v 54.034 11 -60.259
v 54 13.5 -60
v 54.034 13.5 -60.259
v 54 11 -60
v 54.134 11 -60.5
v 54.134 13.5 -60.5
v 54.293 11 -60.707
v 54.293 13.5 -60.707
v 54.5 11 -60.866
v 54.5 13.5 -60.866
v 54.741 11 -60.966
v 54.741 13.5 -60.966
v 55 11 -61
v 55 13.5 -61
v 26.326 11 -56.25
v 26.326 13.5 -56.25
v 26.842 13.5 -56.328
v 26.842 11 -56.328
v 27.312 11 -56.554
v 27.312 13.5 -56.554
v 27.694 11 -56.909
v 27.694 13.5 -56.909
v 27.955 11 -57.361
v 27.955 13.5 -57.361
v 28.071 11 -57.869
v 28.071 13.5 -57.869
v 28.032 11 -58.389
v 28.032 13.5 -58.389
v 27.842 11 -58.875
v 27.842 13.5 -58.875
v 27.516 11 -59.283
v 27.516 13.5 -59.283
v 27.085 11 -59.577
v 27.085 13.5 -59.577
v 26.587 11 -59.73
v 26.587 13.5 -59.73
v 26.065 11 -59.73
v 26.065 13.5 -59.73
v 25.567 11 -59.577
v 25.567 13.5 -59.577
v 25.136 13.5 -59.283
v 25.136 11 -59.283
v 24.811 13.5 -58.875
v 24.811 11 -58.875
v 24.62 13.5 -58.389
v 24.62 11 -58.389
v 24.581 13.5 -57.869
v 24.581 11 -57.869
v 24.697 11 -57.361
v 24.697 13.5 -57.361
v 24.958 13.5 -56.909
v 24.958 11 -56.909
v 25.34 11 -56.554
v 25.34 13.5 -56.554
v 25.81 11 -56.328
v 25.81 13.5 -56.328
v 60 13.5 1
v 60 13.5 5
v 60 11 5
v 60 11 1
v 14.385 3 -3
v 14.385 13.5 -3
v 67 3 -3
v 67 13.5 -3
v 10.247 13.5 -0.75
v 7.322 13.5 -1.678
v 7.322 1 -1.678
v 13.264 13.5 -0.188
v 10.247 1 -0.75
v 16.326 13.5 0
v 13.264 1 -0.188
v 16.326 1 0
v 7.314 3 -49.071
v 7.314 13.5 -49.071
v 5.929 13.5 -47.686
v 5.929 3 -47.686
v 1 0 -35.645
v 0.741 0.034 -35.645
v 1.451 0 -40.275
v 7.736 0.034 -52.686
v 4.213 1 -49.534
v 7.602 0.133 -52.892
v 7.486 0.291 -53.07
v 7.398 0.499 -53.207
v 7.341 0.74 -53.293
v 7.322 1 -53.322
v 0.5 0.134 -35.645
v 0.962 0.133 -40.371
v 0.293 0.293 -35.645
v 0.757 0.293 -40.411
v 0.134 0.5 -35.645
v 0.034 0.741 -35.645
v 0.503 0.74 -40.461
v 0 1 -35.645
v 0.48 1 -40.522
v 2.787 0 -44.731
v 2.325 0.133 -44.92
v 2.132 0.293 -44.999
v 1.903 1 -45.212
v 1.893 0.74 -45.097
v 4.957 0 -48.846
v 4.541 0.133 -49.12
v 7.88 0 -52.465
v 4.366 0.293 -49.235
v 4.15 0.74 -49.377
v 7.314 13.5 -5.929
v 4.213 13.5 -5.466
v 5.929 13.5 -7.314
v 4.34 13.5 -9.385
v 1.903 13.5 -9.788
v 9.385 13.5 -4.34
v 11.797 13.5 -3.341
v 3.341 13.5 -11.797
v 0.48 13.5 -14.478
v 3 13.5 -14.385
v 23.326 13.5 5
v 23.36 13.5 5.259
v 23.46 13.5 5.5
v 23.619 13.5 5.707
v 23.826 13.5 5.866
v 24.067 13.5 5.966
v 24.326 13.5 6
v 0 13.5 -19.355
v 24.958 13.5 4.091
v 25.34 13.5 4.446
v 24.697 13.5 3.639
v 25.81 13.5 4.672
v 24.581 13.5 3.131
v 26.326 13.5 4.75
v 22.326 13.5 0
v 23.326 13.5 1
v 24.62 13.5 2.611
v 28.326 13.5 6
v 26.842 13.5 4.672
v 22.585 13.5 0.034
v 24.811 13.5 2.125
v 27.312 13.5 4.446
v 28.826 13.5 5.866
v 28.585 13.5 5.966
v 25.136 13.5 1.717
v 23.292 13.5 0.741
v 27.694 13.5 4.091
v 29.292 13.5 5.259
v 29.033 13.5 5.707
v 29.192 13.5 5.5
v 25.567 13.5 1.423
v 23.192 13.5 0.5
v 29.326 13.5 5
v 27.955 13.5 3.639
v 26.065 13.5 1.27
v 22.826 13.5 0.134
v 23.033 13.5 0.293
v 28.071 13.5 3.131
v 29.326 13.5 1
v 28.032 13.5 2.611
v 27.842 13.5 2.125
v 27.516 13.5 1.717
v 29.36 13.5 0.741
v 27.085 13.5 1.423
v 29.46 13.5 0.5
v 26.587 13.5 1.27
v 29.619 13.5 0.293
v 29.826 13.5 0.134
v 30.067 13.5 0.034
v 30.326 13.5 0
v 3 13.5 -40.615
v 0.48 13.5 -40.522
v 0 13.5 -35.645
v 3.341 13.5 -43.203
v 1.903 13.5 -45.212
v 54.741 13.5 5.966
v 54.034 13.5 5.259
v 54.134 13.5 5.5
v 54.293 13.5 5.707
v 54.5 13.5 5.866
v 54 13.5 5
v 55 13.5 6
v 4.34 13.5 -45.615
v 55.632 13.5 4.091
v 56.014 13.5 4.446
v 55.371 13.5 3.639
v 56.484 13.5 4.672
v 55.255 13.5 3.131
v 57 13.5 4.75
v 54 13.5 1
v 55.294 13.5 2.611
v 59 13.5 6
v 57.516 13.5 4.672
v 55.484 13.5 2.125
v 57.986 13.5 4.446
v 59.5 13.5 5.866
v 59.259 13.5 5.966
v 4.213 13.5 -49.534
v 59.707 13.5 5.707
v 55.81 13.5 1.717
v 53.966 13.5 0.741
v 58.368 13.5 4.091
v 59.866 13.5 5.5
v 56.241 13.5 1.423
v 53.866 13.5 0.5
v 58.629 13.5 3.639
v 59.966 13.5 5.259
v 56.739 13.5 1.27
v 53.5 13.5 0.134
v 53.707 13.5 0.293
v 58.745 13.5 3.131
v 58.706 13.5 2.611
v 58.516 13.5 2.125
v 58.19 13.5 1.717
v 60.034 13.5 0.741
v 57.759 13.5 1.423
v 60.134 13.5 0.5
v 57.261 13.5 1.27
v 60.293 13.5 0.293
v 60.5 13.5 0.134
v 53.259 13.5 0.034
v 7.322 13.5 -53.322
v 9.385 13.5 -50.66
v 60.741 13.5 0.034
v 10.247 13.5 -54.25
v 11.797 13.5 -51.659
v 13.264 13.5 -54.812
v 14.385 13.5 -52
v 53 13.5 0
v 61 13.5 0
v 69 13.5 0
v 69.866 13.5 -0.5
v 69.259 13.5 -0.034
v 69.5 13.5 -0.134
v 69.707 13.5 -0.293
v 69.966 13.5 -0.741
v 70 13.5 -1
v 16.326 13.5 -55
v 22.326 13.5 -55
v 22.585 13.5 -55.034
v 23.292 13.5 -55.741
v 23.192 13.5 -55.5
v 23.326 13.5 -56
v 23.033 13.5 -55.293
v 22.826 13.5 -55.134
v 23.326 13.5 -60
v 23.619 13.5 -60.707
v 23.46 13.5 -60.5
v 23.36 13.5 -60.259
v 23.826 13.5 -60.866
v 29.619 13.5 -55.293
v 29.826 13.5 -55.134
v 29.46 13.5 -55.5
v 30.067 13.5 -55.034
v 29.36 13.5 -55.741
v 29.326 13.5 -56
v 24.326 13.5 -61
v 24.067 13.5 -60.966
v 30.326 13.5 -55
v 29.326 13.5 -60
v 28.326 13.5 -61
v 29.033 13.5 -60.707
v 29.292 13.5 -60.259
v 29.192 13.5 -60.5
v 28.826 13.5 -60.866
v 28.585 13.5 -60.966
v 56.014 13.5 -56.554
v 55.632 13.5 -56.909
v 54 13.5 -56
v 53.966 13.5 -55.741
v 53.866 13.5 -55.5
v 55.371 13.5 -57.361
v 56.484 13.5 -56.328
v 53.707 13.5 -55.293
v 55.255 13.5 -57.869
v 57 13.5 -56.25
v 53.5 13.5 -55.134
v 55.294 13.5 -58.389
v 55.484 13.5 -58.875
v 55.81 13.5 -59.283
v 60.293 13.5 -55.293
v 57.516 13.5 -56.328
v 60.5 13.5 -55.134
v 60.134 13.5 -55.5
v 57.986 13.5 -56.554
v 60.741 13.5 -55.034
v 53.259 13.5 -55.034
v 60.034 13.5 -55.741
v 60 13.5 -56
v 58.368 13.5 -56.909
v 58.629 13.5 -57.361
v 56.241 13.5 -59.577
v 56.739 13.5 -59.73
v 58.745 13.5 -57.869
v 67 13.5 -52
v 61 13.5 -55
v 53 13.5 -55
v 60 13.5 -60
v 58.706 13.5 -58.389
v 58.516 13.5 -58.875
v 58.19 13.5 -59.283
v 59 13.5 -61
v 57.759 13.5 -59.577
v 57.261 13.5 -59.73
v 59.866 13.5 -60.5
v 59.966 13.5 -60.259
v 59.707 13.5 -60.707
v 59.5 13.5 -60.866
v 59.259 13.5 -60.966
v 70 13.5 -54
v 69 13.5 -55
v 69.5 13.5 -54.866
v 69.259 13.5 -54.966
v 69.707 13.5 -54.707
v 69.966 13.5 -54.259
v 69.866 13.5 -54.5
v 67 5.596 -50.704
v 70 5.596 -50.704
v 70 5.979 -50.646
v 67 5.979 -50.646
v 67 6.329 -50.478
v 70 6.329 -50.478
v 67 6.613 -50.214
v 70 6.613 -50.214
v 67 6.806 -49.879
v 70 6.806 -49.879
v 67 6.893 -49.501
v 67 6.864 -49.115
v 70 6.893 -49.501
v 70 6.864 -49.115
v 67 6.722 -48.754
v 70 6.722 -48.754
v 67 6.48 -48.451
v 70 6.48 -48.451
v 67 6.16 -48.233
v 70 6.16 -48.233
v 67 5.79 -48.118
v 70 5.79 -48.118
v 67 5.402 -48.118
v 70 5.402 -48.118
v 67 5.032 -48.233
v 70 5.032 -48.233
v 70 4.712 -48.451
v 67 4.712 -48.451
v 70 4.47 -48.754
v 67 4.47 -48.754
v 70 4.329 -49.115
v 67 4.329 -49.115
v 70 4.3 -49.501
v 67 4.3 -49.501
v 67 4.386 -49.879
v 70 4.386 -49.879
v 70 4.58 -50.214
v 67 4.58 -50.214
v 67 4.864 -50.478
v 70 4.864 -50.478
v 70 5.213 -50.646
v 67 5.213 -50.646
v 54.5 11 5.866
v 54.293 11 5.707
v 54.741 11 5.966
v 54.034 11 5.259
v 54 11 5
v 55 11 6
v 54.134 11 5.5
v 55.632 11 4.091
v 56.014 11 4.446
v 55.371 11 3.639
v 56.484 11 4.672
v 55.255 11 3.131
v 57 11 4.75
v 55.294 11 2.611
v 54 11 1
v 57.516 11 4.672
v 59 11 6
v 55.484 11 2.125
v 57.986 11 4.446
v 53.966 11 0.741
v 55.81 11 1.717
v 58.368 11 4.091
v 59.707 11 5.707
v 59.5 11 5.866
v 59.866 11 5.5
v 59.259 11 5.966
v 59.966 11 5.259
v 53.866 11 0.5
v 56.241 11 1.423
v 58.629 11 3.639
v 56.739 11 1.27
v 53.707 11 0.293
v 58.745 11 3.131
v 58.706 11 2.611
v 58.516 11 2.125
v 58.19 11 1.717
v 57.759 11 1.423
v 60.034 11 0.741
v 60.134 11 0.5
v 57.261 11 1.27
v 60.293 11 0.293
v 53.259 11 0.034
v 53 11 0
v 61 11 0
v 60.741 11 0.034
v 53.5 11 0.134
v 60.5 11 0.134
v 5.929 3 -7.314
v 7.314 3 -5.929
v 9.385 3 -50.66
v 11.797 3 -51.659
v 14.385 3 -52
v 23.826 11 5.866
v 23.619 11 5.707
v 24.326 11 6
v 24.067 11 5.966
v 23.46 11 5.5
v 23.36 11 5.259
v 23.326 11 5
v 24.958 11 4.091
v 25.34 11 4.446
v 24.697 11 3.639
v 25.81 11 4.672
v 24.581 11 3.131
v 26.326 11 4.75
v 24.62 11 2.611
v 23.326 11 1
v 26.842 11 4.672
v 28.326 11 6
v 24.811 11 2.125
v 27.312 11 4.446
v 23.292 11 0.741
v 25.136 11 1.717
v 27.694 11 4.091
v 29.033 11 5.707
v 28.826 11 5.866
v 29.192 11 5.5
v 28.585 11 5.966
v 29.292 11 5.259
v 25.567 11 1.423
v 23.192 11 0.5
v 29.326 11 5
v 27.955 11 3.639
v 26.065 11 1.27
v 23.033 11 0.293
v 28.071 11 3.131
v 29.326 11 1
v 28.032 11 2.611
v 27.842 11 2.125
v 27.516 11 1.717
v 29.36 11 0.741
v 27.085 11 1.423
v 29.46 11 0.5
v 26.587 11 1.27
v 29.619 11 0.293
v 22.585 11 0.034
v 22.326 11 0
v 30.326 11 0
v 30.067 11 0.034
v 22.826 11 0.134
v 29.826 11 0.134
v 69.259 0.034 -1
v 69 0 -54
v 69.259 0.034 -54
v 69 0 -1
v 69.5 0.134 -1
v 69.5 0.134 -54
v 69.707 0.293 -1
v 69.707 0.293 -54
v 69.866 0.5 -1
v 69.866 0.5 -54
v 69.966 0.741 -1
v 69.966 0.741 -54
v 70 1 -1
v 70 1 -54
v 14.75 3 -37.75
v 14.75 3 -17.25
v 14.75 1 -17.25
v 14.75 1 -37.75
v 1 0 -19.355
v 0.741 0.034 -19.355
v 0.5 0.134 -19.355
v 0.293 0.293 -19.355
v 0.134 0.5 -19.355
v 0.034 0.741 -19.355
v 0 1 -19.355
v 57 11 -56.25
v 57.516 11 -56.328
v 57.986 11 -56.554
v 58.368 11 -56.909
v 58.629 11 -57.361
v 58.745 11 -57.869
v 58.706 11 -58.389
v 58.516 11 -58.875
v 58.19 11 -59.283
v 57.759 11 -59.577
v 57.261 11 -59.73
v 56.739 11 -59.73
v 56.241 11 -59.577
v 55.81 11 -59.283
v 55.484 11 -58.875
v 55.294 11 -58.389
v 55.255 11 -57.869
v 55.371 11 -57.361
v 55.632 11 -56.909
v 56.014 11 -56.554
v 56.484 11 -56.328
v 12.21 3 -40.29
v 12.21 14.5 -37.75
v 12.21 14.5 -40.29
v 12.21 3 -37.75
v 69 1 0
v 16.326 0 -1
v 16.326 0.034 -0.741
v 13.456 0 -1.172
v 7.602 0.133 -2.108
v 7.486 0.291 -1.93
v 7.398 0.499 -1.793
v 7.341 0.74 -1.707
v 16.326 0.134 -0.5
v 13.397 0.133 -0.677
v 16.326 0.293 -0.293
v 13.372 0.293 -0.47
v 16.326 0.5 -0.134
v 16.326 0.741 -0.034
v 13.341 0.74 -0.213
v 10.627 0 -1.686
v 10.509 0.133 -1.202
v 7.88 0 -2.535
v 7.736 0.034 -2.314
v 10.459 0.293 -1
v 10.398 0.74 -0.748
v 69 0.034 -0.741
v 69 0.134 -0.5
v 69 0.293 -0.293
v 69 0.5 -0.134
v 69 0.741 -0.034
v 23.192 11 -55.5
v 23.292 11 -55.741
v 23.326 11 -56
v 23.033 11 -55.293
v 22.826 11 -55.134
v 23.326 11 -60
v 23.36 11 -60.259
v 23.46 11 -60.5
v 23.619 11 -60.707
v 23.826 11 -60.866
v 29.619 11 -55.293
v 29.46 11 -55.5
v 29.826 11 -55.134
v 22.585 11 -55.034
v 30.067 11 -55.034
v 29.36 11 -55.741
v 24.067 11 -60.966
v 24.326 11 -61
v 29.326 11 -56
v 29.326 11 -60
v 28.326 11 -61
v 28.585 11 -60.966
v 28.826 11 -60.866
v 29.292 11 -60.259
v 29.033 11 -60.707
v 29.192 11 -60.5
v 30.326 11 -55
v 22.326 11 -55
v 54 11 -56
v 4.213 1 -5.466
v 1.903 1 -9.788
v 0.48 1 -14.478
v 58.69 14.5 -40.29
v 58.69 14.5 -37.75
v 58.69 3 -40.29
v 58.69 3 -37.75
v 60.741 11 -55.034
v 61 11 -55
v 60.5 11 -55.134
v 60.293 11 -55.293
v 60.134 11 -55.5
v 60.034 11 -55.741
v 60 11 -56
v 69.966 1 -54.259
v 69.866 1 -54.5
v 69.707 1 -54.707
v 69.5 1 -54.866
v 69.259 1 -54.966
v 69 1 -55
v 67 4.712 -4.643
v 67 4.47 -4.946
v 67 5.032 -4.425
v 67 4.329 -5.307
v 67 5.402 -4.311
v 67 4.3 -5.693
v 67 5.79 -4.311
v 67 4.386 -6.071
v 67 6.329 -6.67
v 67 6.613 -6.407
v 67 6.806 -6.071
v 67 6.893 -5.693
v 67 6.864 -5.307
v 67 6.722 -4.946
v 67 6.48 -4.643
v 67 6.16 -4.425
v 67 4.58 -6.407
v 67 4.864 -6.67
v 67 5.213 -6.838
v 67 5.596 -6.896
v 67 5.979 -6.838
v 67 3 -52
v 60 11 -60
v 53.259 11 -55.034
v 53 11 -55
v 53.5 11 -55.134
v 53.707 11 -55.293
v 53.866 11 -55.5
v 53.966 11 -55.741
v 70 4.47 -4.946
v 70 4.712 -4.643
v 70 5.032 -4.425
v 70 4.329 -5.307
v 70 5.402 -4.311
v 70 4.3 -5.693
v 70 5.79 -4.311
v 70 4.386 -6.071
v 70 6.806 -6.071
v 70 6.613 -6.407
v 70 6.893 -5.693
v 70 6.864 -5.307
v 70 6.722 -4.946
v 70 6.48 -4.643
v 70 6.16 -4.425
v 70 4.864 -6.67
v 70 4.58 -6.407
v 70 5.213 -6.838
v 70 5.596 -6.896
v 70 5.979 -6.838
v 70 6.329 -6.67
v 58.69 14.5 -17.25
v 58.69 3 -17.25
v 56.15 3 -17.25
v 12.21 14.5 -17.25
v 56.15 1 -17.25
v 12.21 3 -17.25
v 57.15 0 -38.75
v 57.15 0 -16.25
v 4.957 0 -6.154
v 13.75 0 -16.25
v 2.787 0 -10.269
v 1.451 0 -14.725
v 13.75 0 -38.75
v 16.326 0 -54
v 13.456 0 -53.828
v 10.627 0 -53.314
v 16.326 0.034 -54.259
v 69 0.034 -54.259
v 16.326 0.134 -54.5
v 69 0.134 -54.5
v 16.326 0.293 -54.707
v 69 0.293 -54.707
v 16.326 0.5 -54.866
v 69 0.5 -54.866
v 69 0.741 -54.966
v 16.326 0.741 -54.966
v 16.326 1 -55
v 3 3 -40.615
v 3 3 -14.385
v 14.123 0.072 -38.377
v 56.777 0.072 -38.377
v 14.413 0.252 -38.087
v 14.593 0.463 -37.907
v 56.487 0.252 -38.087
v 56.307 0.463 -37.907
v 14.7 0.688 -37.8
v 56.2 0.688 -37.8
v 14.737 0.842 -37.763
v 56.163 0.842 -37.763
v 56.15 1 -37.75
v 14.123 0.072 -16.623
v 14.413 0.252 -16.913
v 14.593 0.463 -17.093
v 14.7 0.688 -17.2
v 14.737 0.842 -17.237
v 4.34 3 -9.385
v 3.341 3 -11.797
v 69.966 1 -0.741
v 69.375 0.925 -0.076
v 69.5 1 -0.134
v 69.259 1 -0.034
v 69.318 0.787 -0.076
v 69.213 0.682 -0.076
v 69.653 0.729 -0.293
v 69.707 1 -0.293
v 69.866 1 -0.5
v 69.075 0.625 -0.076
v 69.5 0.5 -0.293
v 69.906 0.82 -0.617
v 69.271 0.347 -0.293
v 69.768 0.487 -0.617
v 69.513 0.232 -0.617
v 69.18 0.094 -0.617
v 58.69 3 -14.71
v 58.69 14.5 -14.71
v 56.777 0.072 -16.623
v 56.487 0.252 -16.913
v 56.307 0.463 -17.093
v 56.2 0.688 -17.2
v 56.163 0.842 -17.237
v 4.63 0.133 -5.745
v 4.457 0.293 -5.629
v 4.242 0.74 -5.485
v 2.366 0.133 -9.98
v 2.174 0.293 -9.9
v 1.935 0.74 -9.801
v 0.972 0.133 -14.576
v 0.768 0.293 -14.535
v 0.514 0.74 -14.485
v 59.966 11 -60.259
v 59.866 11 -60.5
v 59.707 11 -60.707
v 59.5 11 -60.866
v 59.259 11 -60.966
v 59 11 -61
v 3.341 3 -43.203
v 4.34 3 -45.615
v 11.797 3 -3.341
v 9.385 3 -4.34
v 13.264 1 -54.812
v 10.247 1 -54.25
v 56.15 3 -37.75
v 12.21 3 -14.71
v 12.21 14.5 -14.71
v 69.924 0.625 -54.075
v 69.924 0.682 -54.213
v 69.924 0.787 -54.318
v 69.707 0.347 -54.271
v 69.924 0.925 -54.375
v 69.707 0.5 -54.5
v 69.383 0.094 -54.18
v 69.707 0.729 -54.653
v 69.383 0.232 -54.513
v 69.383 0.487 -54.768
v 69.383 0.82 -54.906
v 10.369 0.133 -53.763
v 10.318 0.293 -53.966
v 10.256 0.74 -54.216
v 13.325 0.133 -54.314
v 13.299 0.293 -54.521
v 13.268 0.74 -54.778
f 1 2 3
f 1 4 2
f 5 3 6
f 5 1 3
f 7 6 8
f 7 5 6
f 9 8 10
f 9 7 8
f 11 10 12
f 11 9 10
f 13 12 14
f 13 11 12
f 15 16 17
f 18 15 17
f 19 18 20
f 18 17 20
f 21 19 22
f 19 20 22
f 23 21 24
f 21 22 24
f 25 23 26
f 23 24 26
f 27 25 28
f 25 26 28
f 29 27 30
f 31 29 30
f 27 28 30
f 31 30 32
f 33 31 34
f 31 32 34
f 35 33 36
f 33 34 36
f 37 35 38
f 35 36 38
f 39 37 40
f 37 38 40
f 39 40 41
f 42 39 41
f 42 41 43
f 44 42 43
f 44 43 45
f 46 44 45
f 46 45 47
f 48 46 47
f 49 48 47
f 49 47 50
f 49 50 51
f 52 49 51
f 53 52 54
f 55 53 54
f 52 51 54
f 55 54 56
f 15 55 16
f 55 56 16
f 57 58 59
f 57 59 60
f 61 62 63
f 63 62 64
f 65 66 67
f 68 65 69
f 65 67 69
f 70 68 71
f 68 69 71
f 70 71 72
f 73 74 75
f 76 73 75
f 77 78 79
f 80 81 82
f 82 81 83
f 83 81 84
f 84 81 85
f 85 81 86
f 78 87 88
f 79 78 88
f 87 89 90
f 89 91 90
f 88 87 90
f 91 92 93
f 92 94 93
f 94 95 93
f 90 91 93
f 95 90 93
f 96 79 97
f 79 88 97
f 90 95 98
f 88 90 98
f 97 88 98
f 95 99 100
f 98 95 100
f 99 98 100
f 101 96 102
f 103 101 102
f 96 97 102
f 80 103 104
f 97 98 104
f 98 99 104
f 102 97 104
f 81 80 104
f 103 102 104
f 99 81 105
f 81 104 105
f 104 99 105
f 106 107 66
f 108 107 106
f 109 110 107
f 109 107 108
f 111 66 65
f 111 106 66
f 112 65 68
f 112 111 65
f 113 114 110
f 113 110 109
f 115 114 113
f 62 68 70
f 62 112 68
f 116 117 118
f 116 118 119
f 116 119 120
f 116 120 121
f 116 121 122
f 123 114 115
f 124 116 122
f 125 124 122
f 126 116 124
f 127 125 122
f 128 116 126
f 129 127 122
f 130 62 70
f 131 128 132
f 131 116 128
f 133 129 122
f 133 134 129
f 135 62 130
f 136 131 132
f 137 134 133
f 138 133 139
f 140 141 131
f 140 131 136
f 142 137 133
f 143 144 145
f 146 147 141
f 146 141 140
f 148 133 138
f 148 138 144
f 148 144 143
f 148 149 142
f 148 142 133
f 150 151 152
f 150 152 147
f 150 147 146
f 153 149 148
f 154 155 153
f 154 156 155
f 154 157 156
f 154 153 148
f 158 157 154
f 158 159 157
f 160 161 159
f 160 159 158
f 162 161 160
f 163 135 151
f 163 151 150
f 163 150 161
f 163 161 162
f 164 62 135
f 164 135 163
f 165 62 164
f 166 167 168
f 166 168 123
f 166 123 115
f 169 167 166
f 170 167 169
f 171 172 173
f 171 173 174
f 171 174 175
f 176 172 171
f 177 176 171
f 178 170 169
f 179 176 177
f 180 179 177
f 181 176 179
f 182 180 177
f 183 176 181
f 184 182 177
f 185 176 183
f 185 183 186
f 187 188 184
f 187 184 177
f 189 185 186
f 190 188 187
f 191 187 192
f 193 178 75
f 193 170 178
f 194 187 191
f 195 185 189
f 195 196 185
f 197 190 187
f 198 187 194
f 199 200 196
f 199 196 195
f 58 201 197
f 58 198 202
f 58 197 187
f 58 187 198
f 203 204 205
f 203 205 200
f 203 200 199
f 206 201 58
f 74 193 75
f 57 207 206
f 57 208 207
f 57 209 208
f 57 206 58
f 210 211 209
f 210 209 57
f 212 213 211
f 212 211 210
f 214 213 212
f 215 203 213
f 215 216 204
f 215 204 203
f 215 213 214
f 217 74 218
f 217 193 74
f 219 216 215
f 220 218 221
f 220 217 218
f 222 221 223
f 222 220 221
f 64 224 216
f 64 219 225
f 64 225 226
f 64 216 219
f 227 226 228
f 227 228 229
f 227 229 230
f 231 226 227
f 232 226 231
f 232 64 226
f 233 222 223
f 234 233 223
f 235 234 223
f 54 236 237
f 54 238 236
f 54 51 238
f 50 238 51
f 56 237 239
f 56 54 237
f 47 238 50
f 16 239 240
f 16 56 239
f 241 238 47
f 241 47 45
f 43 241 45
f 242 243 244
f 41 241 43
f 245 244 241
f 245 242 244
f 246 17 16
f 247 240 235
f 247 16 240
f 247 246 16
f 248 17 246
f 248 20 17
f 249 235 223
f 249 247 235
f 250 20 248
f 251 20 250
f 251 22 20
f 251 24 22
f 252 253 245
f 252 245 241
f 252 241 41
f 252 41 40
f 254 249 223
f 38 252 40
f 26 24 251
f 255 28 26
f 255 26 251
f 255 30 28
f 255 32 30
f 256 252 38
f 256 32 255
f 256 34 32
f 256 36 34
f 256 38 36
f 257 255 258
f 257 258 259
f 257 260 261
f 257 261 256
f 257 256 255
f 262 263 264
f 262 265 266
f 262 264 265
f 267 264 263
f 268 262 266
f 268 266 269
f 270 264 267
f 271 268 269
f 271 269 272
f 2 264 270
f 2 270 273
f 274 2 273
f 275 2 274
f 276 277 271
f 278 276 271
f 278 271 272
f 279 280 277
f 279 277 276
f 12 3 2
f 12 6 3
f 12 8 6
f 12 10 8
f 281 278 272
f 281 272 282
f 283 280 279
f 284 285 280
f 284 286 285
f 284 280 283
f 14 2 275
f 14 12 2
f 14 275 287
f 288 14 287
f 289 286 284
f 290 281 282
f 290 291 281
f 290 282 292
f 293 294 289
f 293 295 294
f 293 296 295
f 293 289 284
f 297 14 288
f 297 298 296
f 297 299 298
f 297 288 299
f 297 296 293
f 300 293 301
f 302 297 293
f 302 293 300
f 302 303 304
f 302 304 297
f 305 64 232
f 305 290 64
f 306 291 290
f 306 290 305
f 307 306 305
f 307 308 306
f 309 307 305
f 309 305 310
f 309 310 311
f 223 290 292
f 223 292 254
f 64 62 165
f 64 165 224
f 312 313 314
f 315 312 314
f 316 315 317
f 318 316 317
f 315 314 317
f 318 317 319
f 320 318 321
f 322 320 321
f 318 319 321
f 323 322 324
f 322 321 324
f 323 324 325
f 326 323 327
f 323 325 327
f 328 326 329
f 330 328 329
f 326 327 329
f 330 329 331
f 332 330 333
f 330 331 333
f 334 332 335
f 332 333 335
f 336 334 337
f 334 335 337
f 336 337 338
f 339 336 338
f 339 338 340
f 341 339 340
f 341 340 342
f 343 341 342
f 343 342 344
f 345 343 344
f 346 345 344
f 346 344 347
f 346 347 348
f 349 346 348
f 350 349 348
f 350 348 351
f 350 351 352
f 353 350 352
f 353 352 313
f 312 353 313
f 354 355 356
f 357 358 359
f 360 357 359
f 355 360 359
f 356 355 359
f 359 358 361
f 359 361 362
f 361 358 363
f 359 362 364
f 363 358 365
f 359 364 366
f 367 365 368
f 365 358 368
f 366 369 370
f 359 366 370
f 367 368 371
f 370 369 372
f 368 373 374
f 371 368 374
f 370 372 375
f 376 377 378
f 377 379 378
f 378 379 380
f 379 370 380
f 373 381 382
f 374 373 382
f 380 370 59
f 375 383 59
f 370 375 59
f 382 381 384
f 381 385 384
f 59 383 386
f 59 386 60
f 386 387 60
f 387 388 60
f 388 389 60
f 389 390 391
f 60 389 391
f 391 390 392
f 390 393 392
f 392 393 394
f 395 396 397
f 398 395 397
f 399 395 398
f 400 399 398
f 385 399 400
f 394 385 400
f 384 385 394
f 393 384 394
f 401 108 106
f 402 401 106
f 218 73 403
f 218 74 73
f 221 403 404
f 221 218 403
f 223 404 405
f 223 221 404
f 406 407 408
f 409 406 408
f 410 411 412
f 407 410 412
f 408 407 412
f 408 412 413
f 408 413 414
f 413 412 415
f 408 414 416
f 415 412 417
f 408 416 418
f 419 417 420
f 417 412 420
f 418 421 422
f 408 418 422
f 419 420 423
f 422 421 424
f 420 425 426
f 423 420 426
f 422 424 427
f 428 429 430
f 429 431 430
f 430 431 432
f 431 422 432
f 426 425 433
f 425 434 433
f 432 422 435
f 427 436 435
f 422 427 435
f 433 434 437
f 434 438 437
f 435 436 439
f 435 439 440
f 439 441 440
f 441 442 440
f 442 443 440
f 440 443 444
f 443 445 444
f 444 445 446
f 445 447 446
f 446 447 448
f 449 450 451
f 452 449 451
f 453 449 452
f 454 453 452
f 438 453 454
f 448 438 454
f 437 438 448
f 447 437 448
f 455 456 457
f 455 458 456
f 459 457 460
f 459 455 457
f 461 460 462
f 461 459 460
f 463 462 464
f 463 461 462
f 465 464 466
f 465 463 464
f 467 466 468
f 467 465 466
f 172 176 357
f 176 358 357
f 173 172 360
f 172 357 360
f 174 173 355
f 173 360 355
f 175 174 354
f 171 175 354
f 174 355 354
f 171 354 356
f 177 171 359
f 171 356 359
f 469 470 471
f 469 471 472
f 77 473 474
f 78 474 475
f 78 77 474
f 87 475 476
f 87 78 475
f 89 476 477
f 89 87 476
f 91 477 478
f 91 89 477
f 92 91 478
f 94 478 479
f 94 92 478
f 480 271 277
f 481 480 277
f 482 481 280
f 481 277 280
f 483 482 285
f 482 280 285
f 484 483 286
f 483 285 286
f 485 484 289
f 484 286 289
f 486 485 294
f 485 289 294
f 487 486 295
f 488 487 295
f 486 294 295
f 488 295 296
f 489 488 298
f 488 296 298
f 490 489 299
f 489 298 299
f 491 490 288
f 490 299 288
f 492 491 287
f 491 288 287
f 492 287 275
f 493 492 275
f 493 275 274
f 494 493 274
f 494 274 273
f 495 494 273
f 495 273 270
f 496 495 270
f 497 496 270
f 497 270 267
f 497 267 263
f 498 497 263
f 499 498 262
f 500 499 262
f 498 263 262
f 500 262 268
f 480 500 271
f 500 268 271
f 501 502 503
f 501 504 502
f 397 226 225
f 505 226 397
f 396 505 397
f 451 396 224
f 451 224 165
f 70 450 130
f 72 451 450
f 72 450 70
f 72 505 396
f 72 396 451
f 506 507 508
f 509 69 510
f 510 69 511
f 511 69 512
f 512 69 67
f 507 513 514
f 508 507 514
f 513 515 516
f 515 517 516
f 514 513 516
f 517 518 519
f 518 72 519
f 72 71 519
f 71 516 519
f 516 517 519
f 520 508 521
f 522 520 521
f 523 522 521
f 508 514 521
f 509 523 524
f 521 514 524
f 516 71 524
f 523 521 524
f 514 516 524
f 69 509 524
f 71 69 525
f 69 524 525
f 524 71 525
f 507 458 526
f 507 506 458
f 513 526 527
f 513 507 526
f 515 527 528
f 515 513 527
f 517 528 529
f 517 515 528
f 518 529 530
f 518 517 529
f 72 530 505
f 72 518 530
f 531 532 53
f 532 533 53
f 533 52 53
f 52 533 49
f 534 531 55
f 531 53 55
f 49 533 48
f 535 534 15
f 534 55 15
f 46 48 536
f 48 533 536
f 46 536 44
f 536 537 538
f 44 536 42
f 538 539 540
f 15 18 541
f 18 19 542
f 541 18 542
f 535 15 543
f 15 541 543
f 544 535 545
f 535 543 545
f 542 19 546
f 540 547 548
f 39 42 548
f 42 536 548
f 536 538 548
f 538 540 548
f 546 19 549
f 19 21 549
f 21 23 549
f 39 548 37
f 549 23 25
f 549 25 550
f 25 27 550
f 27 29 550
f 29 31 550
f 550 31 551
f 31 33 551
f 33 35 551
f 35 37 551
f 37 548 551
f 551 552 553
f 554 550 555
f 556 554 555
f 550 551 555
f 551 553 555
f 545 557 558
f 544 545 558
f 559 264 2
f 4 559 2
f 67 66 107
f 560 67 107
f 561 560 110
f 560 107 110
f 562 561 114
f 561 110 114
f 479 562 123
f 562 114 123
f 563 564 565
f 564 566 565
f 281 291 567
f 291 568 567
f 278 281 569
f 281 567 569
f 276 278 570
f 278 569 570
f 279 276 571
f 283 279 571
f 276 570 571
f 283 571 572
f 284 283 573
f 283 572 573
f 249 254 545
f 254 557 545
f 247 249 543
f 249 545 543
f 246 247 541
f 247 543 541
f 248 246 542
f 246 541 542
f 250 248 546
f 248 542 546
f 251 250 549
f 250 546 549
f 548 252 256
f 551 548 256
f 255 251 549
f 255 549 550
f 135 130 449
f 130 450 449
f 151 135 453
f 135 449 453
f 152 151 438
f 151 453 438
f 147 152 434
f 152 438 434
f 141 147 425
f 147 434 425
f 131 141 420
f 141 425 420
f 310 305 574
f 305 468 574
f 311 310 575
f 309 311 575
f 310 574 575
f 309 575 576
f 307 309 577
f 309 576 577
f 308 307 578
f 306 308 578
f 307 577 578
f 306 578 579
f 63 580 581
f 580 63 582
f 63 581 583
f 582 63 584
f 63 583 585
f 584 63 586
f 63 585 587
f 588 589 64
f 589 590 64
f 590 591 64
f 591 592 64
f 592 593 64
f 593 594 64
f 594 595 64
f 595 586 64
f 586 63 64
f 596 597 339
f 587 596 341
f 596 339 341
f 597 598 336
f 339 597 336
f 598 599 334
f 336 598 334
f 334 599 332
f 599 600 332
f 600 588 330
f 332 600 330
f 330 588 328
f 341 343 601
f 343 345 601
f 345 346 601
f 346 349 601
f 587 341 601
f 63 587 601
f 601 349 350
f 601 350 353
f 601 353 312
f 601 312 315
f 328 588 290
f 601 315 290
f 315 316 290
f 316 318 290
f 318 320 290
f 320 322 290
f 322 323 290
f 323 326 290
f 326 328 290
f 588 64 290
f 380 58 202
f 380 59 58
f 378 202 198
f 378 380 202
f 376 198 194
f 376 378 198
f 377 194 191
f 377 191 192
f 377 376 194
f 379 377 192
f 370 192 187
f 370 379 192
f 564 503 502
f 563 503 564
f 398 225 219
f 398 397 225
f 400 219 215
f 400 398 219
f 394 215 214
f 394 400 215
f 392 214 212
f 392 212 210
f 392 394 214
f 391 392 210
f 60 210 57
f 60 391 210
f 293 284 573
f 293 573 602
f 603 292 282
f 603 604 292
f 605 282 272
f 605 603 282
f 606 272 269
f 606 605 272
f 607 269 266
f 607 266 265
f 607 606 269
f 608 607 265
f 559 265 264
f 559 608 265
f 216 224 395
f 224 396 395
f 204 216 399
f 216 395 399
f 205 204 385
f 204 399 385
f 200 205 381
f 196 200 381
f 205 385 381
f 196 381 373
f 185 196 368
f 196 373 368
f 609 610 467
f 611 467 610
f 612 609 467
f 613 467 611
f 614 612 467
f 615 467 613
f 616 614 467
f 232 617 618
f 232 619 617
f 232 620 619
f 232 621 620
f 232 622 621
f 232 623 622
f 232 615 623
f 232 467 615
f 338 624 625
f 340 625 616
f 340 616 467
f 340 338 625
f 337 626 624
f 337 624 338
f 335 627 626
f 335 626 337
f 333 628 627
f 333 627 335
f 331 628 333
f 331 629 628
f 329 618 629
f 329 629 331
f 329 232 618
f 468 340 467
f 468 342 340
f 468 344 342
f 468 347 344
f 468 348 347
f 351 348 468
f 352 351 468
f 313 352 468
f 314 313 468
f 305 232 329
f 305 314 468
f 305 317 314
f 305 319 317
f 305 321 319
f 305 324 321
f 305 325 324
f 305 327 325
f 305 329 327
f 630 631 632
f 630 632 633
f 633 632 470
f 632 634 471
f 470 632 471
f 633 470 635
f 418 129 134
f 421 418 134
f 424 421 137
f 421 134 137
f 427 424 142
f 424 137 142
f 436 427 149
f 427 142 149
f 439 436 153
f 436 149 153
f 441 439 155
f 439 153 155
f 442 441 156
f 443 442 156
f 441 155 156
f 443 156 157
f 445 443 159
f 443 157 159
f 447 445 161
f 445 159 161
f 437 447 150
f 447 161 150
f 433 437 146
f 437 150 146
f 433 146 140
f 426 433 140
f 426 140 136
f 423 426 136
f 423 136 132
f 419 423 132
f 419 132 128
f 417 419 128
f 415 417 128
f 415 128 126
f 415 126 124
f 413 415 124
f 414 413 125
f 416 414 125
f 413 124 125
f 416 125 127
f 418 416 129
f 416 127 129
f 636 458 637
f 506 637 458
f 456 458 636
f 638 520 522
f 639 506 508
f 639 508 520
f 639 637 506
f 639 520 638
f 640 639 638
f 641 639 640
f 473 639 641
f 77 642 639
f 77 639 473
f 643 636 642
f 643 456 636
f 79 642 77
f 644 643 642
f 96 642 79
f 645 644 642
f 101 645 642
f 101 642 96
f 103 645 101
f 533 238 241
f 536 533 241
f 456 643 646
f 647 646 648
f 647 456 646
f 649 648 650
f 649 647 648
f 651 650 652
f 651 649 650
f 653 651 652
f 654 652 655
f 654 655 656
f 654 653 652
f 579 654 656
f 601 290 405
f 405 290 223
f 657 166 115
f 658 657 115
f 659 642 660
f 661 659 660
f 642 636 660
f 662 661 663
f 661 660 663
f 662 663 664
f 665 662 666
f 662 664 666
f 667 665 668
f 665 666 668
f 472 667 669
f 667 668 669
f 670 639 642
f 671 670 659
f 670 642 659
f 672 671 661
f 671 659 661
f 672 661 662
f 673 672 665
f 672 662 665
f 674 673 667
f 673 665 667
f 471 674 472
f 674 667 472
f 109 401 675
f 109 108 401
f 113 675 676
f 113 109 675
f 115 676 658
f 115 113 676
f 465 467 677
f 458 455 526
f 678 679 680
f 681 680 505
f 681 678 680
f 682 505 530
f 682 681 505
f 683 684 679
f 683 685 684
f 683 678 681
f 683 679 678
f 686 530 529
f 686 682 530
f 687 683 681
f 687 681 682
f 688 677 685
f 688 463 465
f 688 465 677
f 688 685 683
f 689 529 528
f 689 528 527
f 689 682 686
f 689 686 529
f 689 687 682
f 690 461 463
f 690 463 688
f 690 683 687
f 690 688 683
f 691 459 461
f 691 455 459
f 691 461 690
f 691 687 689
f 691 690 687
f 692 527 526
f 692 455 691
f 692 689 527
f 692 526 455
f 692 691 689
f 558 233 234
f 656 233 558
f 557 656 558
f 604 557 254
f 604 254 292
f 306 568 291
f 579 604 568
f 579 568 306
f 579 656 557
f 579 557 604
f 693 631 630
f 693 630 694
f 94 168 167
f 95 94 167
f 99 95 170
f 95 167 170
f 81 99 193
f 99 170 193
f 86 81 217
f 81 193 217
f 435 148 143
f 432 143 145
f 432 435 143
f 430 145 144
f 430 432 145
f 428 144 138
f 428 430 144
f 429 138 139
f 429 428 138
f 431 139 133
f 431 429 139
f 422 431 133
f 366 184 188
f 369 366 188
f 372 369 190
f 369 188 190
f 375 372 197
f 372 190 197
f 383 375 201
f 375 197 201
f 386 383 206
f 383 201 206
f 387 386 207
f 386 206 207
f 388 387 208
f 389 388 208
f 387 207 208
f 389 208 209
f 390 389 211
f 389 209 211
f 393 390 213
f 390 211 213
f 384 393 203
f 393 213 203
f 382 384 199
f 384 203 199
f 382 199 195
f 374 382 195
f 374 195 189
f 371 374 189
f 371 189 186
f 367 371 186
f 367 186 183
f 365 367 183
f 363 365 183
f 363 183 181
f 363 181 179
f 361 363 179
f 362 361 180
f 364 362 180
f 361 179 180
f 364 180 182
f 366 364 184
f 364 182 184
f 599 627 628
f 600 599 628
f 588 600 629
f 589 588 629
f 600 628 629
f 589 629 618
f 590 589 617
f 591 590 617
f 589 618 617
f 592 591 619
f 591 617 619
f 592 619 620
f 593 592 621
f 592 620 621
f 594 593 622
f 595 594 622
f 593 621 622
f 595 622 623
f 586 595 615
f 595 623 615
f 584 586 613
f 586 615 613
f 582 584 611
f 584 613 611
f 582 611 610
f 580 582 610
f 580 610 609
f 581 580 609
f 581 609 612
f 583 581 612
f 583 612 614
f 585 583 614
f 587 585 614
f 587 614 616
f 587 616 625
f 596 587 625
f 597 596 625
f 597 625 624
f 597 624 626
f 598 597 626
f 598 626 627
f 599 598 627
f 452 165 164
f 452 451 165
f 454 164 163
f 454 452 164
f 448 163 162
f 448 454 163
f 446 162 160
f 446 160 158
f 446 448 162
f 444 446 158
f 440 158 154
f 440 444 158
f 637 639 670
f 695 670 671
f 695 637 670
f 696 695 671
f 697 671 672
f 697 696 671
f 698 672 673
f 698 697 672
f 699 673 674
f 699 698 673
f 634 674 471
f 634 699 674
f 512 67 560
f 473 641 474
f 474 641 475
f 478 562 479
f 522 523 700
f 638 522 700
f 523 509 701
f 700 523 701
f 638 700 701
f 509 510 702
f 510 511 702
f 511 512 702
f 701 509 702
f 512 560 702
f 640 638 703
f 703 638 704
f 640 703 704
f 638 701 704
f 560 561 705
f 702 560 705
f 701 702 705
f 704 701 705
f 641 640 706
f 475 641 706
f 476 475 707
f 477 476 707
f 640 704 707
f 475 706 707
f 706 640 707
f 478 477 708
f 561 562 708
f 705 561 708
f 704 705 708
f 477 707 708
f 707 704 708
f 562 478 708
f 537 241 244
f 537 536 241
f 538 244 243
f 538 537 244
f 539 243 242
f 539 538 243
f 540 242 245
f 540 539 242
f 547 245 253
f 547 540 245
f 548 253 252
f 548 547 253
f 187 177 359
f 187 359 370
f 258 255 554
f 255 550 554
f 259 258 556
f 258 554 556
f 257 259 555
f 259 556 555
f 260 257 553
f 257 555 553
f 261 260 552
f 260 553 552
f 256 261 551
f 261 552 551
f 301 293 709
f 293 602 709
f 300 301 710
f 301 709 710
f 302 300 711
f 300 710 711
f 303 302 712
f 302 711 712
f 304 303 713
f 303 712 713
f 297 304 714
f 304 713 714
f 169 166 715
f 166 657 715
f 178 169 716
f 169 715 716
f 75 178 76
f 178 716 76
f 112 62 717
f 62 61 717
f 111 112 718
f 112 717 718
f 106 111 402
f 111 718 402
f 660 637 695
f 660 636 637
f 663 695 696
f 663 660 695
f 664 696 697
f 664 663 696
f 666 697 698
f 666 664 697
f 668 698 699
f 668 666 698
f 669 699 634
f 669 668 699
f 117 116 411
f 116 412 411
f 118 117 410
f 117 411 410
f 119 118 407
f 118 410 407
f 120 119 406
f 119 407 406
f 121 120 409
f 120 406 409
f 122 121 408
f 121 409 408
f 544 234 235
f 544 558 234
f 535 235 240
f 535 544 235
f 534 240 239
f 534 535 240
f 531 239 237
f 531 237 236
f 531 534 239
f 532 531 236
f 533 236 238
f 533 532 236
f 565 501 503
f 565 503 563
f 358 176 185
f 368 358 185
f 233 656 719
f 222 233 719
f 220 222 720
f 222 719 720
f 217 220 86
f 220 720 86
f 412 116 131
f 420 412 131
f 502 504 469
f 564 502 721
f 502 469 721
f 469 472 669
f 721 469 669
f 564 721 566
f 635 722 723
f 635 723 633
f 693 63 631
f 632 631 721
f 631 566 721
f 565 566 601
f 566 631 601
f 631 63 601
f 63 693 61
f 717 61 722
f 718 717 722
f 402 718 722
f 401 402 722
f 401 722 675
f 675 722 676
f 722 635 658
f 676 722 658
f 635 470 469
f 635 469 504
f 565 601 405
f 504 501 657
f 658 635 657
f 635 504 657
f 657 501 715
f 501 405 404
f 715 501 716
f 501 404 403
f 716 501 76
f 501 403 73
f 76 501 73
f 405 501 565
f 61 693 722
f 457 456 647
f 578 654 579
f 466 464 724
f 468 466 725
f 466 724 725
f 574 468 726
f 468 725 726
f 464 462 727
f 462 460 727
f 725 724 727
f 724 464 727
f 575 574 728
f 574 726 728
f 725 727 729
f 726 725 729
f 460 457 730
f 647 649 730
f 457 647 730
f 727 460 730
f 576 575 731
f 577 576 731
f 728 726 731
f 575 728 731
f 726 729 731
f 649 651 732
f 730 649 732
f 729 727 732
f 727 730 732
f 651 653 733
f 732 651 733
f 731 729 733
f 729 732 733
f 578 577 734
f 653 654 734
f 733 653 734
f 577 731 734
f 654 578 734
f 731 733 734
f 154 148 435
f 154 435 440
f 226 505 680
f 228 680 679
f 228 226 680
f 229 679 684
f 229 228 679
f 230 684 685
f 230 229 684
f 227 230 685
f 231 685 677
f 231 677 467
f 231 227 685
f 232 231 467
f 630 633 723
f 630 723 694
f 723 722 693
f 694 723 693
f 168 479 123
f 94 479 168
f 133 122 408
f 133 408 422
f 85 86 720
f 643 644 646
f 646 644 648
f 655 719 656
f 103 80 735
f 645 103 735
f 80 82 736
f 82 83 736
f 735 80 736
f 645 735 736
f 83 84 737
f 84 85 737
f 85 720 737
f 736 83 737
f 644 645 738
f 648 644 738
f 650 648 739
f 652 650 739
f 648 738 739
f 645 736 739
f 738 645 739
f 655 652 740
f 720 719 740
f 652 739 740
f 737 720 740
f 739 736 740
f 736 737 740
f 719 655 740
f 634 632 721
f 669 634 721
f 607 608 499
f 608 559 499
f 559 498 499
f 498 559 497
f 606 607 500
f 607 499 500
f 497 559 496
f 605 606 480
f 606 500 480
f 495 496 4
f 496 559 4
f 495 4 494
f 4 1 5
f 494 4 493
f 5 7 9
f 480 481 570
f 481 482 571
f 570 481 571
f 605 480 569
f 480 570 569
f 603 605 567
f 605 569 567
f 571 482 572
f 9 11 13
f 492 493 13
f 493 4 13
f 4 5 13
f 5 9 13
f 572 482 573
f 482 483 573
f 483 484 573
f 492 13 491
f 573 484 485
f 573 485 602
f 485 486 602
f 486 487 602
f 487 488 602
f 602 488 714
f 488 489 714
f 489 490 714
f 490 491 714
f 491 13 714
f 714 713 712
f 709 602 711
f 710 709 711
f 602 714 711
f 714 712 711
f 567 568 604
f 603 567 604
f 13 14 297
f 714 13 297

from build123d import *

# Parameters (mm, degrees)
BOSS_EXTRUDE1_DEPTH          = 30
SHELL2_T                     = 3
CUT_EXTRUDE2_REACH           = 183.177
BOSS_EXTRUDE5_DEPTH          = 25.5
SKETCH17_W                   = 8
SKETCH17_H                   = 25.58
BOSS_EXTRUDE6_DEPTH          = 5
CUT_EXTRUDE3_REACH           = 182.934
SKETCH18_R                   = 1.75
SKETCH20_W                   = 197.48203017
SKETCH20_H                   = 83.172325934
CUT_EXTRUDE4_DEPTH           = 16.5
CUT_EXTRUDE5_REACH           = 180.984
OUTLINE_OF_MOTOR_PRESS_FIT_W = 41.4
OUTLINE_OF_MOTOR_PRESS_FIT_H = 20.5
SKETCH24_W                   = 46.48
SKETCH24_H                   = 2.54
BOSS_EXTRUDE7_DEPTH          = 1
CUT_EXTRUDE6_DEPTH           = 180.263074837
CUT_EXTRUDE6_DEPTH_BACK      = 180.263074837
SKETCH26_W                   = 55
SKETCH26_H                   = 13.5
BOSS_EXTRUDE8_DEPTH          = 3
FILLET1_R                    = 25
FILLET2_R                    = 25
SKETCH28_W                   = 6
SKETCH28_H                   = 6
SKETCH28_R                   = 1.75
BOSS_EXTRUDE9_DEPTH          = 2.5
FILLET3_R                    = 1
FILLET4_R                    = 10
CUT_EXTRUDE7_REACH           = 95.975
SKETCH30_R                   = 1.3


with BuildPart() as part:
    # Sketch1 → Boss-Extrude1 (new body)
    with BuildSketch(Plane(origin=(0, 0, 0), x_dir=(1, 0, 0), z_dir=(0, 1, 0))):
        Polygon((0, 46), (9, 55), (161, 55), (170, 46), (170, 9), (161, 0), (9, 0), (0, 9), align=None)
    extrude(amount=BOSS_EXTRUDE1_DEPTH)

    # Shell2 (no face opened: a closed hollow body)
    add(offset(amount=-SHELL2_T, mode=Mode.PRIVATE), mode=Mode.SUBTRACT)

    # Sketch2 → Cut-Extrude2 (cut, up to next)
    with BuildSketch(Plane(origin=(0, 30, 0), x_dir=(1, 0, 0), z_dir=(0, 1, 0)), mode=Mode.PRIVATE) as cut_extrude2_sk1:
        Polygon((3, 44.757359313), (3, 10.242640687), (10.242640687, 3), (159.757359313, 3), (167, 10.242640687), (167, 44.757359313), (159.757359313, 52), (10.242640687, 52), align=None)
    cut_extrude2_tool1 = extrude(cut_extrude2_sk1.sketch, amount=-CUT_EXTRUDE2_REACH, mode=Mode.PRIVATE) & part.part
    add(cut_extrude2_tool1.solids().sort_by_distance((85, 30, -27.5))[0], mode=Mode.SUBTRACT)

    # Sketch16 → Boss-Extrude5 (add)
    with BuildSketch(Plane(origin=(0, 3, 0), x_dir=(1, 0, 0), z_dir=(0, 1, 0))):
        Polygon((52.69, 40.29), (18.21, 40.29), (12.21, 40.29), (12.21, 37.75), (14.75, 37.75), (18.21, 37.75), (52.69, 37.75), (56.15, 37.75), (58.69, 37.75), (58.69, 40.29), align=None)
        Polygon((18.21, 17.25), (52.69, 17.25), (56.15, 17.25), (58.69, 17.25), (58.69, 14.71), (52.69, 14.71), (18.21, 14.71), (12.21, 14.71), (12.21, 17.25), (14.75, 17.25), align=None)
    extrude(amount=BOSS_EXTRUDE5_DEPTH)

    # Sketch17 → Boss-Extrude6 (add)
    with BuildSketch(Plane(origin=(0, 28.5, 0), x_dir=(1, 0, 0), z_dir=(0, 1, 0))):
        with Locations((60.192970397, 27.5)):
            Rectangle(SKETCH17_W, SKETCH17_H)
        with Locations((10.75, 27.5)):
            Rectangle(SKETCH17_W, SKETCH17_H)
    extrude(amount=-BOSS_EXTRUDE6_DEPTH)

    # Sketch18 → Cut-Extrude3 (cut, up to next)
    with BuildSketch(Plane(origin=(0, 28.5, 0), x_dir=(1, 0, 0), z_dir=(0, 1, 0)), mode=Mode.PRIVATE) as cut_extrude3_sk1:
        with Locations(Location((59.75, 32.5, 0), (0, 0, 270))):
            Circle(SKETCH18_R)
    cut_extrude3_tool1 = extrude(cut_extrude3_sk1.sketch, amount=-CUT_EXTRUDE3_REACH, mode=Mode.PRIVATE) & part.part
    # Sketch18 → Cut-Extrude3 (cut, up to next)
    with BuildSketch(Plane(origin=(0, 28.5, 0), x_dir=(1, 0, 0), z_dir=(0, 1, 0)), mode=Mode.PRIVATE) as cut_extrude3_sk2:
        with Locations(Location((59.75, 22.5, 0), (0, 0, 270))):
            Circle(SKETCH18_R)
    cut_extrude3_tool2 = extrude(cut_extrude3_sk2.sketch, amount=-CUT_EXTRUDE3_REACH, mode=Mode.PRIVATE) & part.part
    # Sketch18 → Cut-Extrude3 (cut, up to next)
    with BuildSketch(Plane(origin=(0, 28.5, 0), x_dir=(1, 0, 0), z_dir=(0, 1, 0)), mode=Mode.PRIVATE) as cut_extrude3_sk3:
        with Locations(Location((11.15, 22.5, 0), (0, 0, 270))):
            Circle(SKETCH18_R)
    cut_extrude3_tool3 = extrude(cut_extrude3_sk3.sketch, amount=-CUT_EXTRUDE3_REACH, mode=Mode.PRIVATE) & part.part
    # Sketch18 → Cut-Extrude3 (cut, up to next)
    with BuildSketch(Plane(origin=(0, 28.5, 0), x_dir=(1, 0, 0), z_dir=(0, 1, 0)), mode=Mode.PRIVATE) as cut_extrude3_sk4:
        with Locations(Location((11.15, 32.5, 0), (0, 0, 270))):
            Circle(SKETCH18_R)
    cut_extrude3_tool4 = extrude(cut_extrude3_sk4.sketch, amount=-CUT_EXTRUDE3_REACH, mode=Mode.PRIVATE) & part.part
    add(cut_extrude3_tool1.solids().sort_by_distance((59.75, 28.5, -32.5))[0], mode=Mode.SUBTRACT)
    add(cut_extrude3_tool2.solids().sort_by_distance((59.75, 28.5, -22.5))[0], mode=Mode.SUBTRACT)
    add(cut_extrude3_tool3.solids().sort_by_distance((11.15, 28.5, -22.5))[0], mode=Mode.SUBTRACT)
    add(cut_extrude3_tool4.solids().sort_by_distance((11.15, 28.5, -32.5))[0], mode=Mode.SUBTRACT)

    # Sketch20 → Cut-Extrude4 (cut)
    with BuildSketch(Plane(origin=(0, 30, 0), x_dir=(1, 0, 0), z_dir=(0, 1, 0))):
        with Locations((90.328880179, 24.260876754)):
            Rectangle(SKETCH20_W, SKETCH20_H)
    extrude(amount=-CUT_EXTRUDE4_DEPTH, mode=Mode.SUBTRACT)

    # Outline of motor press fit → Cut-Extrude5 (cut, up to next)
    with BuildSketch(Plane(origin=(0, 3, 0), x_dir=(1, 0, 0), z_dir=(0, 1, 0)), mode=Mode.PRIVATE) as cut_extrude5_sk1:
        with Locations((35.45, 27.5)):
            Rectangle(OUTLINE_OF_MOTOR_PRESS_FIT_W, OUTLINE_OF_MOTOR_PRESS_FIT_H)
    cut_extrude5_tool1 = extrude(cut_extrude5_sk1.sketch, amount=-CUT_EXTRUDE5_REACH, mode=Mode.PRIVATE) & part.part
    add(cut_extrude5_tool1.solids().sort_by_distance((35.45, 3, -27.5))[0], mode=Mode.SUBTRACT)

    # Sketch24 → Boss-Extrude7 (add)
    with BuildSketch(Plane(origin=(0, 13.5, 0), x_dir=(1, 0, 0), z_dir=(0, 1, 0))):
        with Locations((35.45, 39.02)):
            Rectangle(SKETCH24_W, SKETCH24_H)
        with Locations((35.45, 15.98)):
            Rectangle(SKETCH24_W, SKETCH24_H)
    extrude(amount=BOSS_EXTRUDE7_DEPTH)

    # Sketch25 → Cut-Extrude6 (cut, two sides: drawn at the far end of the back side and taken through both)
    with BuildSketch(Plane.XZ.offset(-CUT_EXTRUDE6_DEPTH_BACK)):
        Polygon((70, 13.461759558), (70, -84.299003111), (188.235365379, -84.299003111), (188.235365379, 23.0423143), (70, 19.718448369), align=None)
    extrude(amount=CUT_EXTRUDE6_DEPTH + CUT_EXTRUDE6_DEPTH_BACK, mode=Mode.SUBTRACT)

    # Sketch26 → Boss-Extrude8 (add)
    with BuildSketch(Plane(origin=(70, 0, 0), x_dir=(0, 0, -1), z_dir=(1, 0, 0))):
        with Locations((27.5, 6.75)):
            Rectangle(SKETCH26_W, SKETCH26_H)
    extrude(amount=-BOSS_EXTRUDE8_DEPTH)

    # Fillet1
    fillet1_edges = [part.edges().sort_by_distance(p)[0] for p in [
        (0, 6.75, -46),
        (0, 6.75, -9),
    ]]
    fillet(fillet1_edges, radius=FILLET1_R)

    # Fillet2
    # the kernel refuses this fillet: 25 mm, written as the material it takes off along each edge
    with BuildSketch(Plane(origin=(9, -18.315393785, 0), x_dir=(-0.7071067811865396, 0, -0.7071067811865553), z_dir=(0, 1, 0))) as fillet2_piece_1:
        with BuildLine():
            CenterArc((12.497293871, -22.858045188), FILLET2_R, 113.890402407, 21.109597593)
            Line((-5.180375658, -5.180375658), (-5.533929049, -4.826822268))
            Line((-5.533929049, -4.826822268), (-0.353553391, 0.353553391))
            Line((-0.353553391, 0.353553391), (0, 0.5))
            ThreePointArc((0, 0.5), (1.186291501, 0.5), (2.170088785, 0.457160904))
            Line((2.170088785, 0.457160904), (2.372583002, 0))
        make_face()
    extrude(amount=50.13078757, mode=Mode.SUBTRACT)
    with BuildSketch(Plane(origin=(9, -18.315393785, -55), x_dir=(-0.7071067811865434, 0, 0.7071067811865516), z_dir=(0, 1, 0))) as fillet2_piece_2:
        with BuildLine():
            CenterArc((12.497293871, 22.858045188), FILLET2_R, 225, 21.109597593)
            Line((-5.180375658, 5.180375658), (-5.533929049, 4.826822268))
            Line((-5.533929049, 4.826822268), (-0.353553391, -0.353553391))
            Line((-0.353553391, -0.353553391), (0, -0.5))
            ThreePointArc((0, -0.5), (1.186291501, -0.5), (2.170088785, -0.457160904))
            Line((2.170088785, -0.457160904), (2.372583002, 0))
        make_face()
    extrude(amount=50.13078757, mode=Mode.SUBTRACT)

    # Sketch28 → Boss-Extrude9 (add)
    # profile 1 of 4: a face of its own
    with BuildSketch(Plane(origin=(0, 13.5, 0), x_dir=(1, 0, 0), z_dir=(0, 1, 0))):
        with Locations((26.326157514, 58)):
            Rectangle(SKETCH28_W, SKETCH28_H)
        with Locations(Location((26.326157514, 58, 0), (0, 0, 270))):
            Circle(SKETCH28_R, mode=Mode.SUBTRACT)
    # profile 2 of 4: a face of its own
    with BuildSketch(Plane(origin=(0, 13.5, 0), x_dir=(1, 0, 0), z_dir=(0, 1, 0))):
        with Locations((57, 58)):
            Rectangle(SKETCH28_W, SKETCH28_H)
        with Locations(Location((57, 58, 0), (0, 0, 270))):
            Circle(SKETCH28_R, mode=Mode.SUBTRACT)
    # profile 3 of 4: a face of its own
    with BuildSketch(Plane(origin=(0, 13.5, 0), x_dir=(1, 0, 0), z_dir=(0, 1, 0))):
        with Locations((57, -3)):
            Rectangle(SKETCH28_W, SKETCH28_H)
        with Locations(Location((57, -3, 0), (0, 0, 270))):
            Circle(SKETCH28_R, mode=Mode.SUBTRACT)
    # profile 4 of 4: a face of its own
    with BuildSketch(Plane(origin=(0, 13.5, 0), x_dir=(1, 0, 0), z_dir=(0, 1, 0))):
        with Locations((26.326157514, -3)):
            Rectangle(SKETCH28_W, SKETCH28_H)
        with Locations(Location((26.326157514, -3, 0), (0, 0, 270))):
            Circle(SKETCH28_R, mode=Mode.SUBTRACT)
    extrude(amount=-BOSS_EXTRUDE9_DEPTH)

    # Fillet3
    fillet3_edges = [part.edges().sort_by_distance(p)[0] for p in [
        (14.75, 0, -27.5),
        (35.45, 0, -37.75),
        (56.15, 0, -27.5),
        (35.45, 0, -17.25),
        (43.163078757, 0, -55),
        (70, 0, -27.5),
        (70, 6.75, -55),
        (70, 6.75, 0),
        (0, 0, -27.5),
        (1.903011687, 0, -45.21174675),
        (1.903011687, 0, -9.78825325),
        (43.163078757, 0, 0),
        (11.746761362, 0, -54.577004107),
        (11.746761362, 0, -0.422995893),
        (23.326157514, 12.25, 0),
        (29.326157514, 12.25, 0),
        (29.326157514, 12.25, 6),
        (23.326157514, 12.25, 6),
        (60, 12.25, 0),
        (60, 12.25, 6),
        (54, 12.25, 6),
        (54, 12.25, 0),
        (54, 12.25, -55),
        (54, 12.25, -61),
        (60, 12.25, -61),
        (60, 12.25, -55),
        (29.326157514, 12.25, -55),
        (23.326157514, 12.25, -55),
        (23.326157514, 12.25, -61),
        (29.326157514, 12.25, -61),
    ]]
    fillet(fillet3_edges, radius=FILLET3_R)

    # Fillet4
    fillet4_edges = [part.edges().sort_by_distance(p)[0] for p in [
        (10.242640687, 8.25, -52),
        (3, 8.25, -44.757359313),
        (10.242640687, 8.25, -3),
        (3, 8.25, -10.242640687),
    ]]
    fillet(fillet4_edges, radius=FILLET4_R)

    # Sketch30 → Cut-Extrude7 (cut, up to next)
    with BuildSketch(Plane(origin=(70, 0, 0), x_dir=(0, 0, -1), z_dir=(1, 0, 0)), mode=Mode.PRIVATE) as cut_extrude7_sk1:
        with Locations((5.596194078, 5.596194078)):
            Circle(SKETCH30_R)
    cut_extrude7_tool1 = extrude(cut_extrude7_sk1.sketch, amount=-CUT_EXTRUDE7_REACH, mode=Mode.PRIVATE) & part.part
    # Sketch30 → Cut-Extrude7 (cut, up to next)
    with BuildSketch(Plane(origin=(70, 0, 0), x_dir=(0, 0, -1), z_dir=(1, 0, 0)), mode=Mode.PRIVATE) as cut_extrude7_sk2:
        with Locations((49.403805922, 5.596194078)):
            Circle(SKETCH30_R)
    cut_extrude7_tool2 = extrude(cut_extrude7_sk2.sketch, amount=-CUT_EXTRUDE7_REACH, mode=Mode.PRIVATE) & part.part
    add(cut_extrude7_tool1.solids().sort_by_distance((70, 5.596194, -5.596194))[0], mode=Mode.SUBTRACT)
    add(cut_extrude7_tool2.solids().sort_by_distance((70, 5.596194, -49.403806))[0], mode=Mode.SUBTRACT)


solid = part.part
